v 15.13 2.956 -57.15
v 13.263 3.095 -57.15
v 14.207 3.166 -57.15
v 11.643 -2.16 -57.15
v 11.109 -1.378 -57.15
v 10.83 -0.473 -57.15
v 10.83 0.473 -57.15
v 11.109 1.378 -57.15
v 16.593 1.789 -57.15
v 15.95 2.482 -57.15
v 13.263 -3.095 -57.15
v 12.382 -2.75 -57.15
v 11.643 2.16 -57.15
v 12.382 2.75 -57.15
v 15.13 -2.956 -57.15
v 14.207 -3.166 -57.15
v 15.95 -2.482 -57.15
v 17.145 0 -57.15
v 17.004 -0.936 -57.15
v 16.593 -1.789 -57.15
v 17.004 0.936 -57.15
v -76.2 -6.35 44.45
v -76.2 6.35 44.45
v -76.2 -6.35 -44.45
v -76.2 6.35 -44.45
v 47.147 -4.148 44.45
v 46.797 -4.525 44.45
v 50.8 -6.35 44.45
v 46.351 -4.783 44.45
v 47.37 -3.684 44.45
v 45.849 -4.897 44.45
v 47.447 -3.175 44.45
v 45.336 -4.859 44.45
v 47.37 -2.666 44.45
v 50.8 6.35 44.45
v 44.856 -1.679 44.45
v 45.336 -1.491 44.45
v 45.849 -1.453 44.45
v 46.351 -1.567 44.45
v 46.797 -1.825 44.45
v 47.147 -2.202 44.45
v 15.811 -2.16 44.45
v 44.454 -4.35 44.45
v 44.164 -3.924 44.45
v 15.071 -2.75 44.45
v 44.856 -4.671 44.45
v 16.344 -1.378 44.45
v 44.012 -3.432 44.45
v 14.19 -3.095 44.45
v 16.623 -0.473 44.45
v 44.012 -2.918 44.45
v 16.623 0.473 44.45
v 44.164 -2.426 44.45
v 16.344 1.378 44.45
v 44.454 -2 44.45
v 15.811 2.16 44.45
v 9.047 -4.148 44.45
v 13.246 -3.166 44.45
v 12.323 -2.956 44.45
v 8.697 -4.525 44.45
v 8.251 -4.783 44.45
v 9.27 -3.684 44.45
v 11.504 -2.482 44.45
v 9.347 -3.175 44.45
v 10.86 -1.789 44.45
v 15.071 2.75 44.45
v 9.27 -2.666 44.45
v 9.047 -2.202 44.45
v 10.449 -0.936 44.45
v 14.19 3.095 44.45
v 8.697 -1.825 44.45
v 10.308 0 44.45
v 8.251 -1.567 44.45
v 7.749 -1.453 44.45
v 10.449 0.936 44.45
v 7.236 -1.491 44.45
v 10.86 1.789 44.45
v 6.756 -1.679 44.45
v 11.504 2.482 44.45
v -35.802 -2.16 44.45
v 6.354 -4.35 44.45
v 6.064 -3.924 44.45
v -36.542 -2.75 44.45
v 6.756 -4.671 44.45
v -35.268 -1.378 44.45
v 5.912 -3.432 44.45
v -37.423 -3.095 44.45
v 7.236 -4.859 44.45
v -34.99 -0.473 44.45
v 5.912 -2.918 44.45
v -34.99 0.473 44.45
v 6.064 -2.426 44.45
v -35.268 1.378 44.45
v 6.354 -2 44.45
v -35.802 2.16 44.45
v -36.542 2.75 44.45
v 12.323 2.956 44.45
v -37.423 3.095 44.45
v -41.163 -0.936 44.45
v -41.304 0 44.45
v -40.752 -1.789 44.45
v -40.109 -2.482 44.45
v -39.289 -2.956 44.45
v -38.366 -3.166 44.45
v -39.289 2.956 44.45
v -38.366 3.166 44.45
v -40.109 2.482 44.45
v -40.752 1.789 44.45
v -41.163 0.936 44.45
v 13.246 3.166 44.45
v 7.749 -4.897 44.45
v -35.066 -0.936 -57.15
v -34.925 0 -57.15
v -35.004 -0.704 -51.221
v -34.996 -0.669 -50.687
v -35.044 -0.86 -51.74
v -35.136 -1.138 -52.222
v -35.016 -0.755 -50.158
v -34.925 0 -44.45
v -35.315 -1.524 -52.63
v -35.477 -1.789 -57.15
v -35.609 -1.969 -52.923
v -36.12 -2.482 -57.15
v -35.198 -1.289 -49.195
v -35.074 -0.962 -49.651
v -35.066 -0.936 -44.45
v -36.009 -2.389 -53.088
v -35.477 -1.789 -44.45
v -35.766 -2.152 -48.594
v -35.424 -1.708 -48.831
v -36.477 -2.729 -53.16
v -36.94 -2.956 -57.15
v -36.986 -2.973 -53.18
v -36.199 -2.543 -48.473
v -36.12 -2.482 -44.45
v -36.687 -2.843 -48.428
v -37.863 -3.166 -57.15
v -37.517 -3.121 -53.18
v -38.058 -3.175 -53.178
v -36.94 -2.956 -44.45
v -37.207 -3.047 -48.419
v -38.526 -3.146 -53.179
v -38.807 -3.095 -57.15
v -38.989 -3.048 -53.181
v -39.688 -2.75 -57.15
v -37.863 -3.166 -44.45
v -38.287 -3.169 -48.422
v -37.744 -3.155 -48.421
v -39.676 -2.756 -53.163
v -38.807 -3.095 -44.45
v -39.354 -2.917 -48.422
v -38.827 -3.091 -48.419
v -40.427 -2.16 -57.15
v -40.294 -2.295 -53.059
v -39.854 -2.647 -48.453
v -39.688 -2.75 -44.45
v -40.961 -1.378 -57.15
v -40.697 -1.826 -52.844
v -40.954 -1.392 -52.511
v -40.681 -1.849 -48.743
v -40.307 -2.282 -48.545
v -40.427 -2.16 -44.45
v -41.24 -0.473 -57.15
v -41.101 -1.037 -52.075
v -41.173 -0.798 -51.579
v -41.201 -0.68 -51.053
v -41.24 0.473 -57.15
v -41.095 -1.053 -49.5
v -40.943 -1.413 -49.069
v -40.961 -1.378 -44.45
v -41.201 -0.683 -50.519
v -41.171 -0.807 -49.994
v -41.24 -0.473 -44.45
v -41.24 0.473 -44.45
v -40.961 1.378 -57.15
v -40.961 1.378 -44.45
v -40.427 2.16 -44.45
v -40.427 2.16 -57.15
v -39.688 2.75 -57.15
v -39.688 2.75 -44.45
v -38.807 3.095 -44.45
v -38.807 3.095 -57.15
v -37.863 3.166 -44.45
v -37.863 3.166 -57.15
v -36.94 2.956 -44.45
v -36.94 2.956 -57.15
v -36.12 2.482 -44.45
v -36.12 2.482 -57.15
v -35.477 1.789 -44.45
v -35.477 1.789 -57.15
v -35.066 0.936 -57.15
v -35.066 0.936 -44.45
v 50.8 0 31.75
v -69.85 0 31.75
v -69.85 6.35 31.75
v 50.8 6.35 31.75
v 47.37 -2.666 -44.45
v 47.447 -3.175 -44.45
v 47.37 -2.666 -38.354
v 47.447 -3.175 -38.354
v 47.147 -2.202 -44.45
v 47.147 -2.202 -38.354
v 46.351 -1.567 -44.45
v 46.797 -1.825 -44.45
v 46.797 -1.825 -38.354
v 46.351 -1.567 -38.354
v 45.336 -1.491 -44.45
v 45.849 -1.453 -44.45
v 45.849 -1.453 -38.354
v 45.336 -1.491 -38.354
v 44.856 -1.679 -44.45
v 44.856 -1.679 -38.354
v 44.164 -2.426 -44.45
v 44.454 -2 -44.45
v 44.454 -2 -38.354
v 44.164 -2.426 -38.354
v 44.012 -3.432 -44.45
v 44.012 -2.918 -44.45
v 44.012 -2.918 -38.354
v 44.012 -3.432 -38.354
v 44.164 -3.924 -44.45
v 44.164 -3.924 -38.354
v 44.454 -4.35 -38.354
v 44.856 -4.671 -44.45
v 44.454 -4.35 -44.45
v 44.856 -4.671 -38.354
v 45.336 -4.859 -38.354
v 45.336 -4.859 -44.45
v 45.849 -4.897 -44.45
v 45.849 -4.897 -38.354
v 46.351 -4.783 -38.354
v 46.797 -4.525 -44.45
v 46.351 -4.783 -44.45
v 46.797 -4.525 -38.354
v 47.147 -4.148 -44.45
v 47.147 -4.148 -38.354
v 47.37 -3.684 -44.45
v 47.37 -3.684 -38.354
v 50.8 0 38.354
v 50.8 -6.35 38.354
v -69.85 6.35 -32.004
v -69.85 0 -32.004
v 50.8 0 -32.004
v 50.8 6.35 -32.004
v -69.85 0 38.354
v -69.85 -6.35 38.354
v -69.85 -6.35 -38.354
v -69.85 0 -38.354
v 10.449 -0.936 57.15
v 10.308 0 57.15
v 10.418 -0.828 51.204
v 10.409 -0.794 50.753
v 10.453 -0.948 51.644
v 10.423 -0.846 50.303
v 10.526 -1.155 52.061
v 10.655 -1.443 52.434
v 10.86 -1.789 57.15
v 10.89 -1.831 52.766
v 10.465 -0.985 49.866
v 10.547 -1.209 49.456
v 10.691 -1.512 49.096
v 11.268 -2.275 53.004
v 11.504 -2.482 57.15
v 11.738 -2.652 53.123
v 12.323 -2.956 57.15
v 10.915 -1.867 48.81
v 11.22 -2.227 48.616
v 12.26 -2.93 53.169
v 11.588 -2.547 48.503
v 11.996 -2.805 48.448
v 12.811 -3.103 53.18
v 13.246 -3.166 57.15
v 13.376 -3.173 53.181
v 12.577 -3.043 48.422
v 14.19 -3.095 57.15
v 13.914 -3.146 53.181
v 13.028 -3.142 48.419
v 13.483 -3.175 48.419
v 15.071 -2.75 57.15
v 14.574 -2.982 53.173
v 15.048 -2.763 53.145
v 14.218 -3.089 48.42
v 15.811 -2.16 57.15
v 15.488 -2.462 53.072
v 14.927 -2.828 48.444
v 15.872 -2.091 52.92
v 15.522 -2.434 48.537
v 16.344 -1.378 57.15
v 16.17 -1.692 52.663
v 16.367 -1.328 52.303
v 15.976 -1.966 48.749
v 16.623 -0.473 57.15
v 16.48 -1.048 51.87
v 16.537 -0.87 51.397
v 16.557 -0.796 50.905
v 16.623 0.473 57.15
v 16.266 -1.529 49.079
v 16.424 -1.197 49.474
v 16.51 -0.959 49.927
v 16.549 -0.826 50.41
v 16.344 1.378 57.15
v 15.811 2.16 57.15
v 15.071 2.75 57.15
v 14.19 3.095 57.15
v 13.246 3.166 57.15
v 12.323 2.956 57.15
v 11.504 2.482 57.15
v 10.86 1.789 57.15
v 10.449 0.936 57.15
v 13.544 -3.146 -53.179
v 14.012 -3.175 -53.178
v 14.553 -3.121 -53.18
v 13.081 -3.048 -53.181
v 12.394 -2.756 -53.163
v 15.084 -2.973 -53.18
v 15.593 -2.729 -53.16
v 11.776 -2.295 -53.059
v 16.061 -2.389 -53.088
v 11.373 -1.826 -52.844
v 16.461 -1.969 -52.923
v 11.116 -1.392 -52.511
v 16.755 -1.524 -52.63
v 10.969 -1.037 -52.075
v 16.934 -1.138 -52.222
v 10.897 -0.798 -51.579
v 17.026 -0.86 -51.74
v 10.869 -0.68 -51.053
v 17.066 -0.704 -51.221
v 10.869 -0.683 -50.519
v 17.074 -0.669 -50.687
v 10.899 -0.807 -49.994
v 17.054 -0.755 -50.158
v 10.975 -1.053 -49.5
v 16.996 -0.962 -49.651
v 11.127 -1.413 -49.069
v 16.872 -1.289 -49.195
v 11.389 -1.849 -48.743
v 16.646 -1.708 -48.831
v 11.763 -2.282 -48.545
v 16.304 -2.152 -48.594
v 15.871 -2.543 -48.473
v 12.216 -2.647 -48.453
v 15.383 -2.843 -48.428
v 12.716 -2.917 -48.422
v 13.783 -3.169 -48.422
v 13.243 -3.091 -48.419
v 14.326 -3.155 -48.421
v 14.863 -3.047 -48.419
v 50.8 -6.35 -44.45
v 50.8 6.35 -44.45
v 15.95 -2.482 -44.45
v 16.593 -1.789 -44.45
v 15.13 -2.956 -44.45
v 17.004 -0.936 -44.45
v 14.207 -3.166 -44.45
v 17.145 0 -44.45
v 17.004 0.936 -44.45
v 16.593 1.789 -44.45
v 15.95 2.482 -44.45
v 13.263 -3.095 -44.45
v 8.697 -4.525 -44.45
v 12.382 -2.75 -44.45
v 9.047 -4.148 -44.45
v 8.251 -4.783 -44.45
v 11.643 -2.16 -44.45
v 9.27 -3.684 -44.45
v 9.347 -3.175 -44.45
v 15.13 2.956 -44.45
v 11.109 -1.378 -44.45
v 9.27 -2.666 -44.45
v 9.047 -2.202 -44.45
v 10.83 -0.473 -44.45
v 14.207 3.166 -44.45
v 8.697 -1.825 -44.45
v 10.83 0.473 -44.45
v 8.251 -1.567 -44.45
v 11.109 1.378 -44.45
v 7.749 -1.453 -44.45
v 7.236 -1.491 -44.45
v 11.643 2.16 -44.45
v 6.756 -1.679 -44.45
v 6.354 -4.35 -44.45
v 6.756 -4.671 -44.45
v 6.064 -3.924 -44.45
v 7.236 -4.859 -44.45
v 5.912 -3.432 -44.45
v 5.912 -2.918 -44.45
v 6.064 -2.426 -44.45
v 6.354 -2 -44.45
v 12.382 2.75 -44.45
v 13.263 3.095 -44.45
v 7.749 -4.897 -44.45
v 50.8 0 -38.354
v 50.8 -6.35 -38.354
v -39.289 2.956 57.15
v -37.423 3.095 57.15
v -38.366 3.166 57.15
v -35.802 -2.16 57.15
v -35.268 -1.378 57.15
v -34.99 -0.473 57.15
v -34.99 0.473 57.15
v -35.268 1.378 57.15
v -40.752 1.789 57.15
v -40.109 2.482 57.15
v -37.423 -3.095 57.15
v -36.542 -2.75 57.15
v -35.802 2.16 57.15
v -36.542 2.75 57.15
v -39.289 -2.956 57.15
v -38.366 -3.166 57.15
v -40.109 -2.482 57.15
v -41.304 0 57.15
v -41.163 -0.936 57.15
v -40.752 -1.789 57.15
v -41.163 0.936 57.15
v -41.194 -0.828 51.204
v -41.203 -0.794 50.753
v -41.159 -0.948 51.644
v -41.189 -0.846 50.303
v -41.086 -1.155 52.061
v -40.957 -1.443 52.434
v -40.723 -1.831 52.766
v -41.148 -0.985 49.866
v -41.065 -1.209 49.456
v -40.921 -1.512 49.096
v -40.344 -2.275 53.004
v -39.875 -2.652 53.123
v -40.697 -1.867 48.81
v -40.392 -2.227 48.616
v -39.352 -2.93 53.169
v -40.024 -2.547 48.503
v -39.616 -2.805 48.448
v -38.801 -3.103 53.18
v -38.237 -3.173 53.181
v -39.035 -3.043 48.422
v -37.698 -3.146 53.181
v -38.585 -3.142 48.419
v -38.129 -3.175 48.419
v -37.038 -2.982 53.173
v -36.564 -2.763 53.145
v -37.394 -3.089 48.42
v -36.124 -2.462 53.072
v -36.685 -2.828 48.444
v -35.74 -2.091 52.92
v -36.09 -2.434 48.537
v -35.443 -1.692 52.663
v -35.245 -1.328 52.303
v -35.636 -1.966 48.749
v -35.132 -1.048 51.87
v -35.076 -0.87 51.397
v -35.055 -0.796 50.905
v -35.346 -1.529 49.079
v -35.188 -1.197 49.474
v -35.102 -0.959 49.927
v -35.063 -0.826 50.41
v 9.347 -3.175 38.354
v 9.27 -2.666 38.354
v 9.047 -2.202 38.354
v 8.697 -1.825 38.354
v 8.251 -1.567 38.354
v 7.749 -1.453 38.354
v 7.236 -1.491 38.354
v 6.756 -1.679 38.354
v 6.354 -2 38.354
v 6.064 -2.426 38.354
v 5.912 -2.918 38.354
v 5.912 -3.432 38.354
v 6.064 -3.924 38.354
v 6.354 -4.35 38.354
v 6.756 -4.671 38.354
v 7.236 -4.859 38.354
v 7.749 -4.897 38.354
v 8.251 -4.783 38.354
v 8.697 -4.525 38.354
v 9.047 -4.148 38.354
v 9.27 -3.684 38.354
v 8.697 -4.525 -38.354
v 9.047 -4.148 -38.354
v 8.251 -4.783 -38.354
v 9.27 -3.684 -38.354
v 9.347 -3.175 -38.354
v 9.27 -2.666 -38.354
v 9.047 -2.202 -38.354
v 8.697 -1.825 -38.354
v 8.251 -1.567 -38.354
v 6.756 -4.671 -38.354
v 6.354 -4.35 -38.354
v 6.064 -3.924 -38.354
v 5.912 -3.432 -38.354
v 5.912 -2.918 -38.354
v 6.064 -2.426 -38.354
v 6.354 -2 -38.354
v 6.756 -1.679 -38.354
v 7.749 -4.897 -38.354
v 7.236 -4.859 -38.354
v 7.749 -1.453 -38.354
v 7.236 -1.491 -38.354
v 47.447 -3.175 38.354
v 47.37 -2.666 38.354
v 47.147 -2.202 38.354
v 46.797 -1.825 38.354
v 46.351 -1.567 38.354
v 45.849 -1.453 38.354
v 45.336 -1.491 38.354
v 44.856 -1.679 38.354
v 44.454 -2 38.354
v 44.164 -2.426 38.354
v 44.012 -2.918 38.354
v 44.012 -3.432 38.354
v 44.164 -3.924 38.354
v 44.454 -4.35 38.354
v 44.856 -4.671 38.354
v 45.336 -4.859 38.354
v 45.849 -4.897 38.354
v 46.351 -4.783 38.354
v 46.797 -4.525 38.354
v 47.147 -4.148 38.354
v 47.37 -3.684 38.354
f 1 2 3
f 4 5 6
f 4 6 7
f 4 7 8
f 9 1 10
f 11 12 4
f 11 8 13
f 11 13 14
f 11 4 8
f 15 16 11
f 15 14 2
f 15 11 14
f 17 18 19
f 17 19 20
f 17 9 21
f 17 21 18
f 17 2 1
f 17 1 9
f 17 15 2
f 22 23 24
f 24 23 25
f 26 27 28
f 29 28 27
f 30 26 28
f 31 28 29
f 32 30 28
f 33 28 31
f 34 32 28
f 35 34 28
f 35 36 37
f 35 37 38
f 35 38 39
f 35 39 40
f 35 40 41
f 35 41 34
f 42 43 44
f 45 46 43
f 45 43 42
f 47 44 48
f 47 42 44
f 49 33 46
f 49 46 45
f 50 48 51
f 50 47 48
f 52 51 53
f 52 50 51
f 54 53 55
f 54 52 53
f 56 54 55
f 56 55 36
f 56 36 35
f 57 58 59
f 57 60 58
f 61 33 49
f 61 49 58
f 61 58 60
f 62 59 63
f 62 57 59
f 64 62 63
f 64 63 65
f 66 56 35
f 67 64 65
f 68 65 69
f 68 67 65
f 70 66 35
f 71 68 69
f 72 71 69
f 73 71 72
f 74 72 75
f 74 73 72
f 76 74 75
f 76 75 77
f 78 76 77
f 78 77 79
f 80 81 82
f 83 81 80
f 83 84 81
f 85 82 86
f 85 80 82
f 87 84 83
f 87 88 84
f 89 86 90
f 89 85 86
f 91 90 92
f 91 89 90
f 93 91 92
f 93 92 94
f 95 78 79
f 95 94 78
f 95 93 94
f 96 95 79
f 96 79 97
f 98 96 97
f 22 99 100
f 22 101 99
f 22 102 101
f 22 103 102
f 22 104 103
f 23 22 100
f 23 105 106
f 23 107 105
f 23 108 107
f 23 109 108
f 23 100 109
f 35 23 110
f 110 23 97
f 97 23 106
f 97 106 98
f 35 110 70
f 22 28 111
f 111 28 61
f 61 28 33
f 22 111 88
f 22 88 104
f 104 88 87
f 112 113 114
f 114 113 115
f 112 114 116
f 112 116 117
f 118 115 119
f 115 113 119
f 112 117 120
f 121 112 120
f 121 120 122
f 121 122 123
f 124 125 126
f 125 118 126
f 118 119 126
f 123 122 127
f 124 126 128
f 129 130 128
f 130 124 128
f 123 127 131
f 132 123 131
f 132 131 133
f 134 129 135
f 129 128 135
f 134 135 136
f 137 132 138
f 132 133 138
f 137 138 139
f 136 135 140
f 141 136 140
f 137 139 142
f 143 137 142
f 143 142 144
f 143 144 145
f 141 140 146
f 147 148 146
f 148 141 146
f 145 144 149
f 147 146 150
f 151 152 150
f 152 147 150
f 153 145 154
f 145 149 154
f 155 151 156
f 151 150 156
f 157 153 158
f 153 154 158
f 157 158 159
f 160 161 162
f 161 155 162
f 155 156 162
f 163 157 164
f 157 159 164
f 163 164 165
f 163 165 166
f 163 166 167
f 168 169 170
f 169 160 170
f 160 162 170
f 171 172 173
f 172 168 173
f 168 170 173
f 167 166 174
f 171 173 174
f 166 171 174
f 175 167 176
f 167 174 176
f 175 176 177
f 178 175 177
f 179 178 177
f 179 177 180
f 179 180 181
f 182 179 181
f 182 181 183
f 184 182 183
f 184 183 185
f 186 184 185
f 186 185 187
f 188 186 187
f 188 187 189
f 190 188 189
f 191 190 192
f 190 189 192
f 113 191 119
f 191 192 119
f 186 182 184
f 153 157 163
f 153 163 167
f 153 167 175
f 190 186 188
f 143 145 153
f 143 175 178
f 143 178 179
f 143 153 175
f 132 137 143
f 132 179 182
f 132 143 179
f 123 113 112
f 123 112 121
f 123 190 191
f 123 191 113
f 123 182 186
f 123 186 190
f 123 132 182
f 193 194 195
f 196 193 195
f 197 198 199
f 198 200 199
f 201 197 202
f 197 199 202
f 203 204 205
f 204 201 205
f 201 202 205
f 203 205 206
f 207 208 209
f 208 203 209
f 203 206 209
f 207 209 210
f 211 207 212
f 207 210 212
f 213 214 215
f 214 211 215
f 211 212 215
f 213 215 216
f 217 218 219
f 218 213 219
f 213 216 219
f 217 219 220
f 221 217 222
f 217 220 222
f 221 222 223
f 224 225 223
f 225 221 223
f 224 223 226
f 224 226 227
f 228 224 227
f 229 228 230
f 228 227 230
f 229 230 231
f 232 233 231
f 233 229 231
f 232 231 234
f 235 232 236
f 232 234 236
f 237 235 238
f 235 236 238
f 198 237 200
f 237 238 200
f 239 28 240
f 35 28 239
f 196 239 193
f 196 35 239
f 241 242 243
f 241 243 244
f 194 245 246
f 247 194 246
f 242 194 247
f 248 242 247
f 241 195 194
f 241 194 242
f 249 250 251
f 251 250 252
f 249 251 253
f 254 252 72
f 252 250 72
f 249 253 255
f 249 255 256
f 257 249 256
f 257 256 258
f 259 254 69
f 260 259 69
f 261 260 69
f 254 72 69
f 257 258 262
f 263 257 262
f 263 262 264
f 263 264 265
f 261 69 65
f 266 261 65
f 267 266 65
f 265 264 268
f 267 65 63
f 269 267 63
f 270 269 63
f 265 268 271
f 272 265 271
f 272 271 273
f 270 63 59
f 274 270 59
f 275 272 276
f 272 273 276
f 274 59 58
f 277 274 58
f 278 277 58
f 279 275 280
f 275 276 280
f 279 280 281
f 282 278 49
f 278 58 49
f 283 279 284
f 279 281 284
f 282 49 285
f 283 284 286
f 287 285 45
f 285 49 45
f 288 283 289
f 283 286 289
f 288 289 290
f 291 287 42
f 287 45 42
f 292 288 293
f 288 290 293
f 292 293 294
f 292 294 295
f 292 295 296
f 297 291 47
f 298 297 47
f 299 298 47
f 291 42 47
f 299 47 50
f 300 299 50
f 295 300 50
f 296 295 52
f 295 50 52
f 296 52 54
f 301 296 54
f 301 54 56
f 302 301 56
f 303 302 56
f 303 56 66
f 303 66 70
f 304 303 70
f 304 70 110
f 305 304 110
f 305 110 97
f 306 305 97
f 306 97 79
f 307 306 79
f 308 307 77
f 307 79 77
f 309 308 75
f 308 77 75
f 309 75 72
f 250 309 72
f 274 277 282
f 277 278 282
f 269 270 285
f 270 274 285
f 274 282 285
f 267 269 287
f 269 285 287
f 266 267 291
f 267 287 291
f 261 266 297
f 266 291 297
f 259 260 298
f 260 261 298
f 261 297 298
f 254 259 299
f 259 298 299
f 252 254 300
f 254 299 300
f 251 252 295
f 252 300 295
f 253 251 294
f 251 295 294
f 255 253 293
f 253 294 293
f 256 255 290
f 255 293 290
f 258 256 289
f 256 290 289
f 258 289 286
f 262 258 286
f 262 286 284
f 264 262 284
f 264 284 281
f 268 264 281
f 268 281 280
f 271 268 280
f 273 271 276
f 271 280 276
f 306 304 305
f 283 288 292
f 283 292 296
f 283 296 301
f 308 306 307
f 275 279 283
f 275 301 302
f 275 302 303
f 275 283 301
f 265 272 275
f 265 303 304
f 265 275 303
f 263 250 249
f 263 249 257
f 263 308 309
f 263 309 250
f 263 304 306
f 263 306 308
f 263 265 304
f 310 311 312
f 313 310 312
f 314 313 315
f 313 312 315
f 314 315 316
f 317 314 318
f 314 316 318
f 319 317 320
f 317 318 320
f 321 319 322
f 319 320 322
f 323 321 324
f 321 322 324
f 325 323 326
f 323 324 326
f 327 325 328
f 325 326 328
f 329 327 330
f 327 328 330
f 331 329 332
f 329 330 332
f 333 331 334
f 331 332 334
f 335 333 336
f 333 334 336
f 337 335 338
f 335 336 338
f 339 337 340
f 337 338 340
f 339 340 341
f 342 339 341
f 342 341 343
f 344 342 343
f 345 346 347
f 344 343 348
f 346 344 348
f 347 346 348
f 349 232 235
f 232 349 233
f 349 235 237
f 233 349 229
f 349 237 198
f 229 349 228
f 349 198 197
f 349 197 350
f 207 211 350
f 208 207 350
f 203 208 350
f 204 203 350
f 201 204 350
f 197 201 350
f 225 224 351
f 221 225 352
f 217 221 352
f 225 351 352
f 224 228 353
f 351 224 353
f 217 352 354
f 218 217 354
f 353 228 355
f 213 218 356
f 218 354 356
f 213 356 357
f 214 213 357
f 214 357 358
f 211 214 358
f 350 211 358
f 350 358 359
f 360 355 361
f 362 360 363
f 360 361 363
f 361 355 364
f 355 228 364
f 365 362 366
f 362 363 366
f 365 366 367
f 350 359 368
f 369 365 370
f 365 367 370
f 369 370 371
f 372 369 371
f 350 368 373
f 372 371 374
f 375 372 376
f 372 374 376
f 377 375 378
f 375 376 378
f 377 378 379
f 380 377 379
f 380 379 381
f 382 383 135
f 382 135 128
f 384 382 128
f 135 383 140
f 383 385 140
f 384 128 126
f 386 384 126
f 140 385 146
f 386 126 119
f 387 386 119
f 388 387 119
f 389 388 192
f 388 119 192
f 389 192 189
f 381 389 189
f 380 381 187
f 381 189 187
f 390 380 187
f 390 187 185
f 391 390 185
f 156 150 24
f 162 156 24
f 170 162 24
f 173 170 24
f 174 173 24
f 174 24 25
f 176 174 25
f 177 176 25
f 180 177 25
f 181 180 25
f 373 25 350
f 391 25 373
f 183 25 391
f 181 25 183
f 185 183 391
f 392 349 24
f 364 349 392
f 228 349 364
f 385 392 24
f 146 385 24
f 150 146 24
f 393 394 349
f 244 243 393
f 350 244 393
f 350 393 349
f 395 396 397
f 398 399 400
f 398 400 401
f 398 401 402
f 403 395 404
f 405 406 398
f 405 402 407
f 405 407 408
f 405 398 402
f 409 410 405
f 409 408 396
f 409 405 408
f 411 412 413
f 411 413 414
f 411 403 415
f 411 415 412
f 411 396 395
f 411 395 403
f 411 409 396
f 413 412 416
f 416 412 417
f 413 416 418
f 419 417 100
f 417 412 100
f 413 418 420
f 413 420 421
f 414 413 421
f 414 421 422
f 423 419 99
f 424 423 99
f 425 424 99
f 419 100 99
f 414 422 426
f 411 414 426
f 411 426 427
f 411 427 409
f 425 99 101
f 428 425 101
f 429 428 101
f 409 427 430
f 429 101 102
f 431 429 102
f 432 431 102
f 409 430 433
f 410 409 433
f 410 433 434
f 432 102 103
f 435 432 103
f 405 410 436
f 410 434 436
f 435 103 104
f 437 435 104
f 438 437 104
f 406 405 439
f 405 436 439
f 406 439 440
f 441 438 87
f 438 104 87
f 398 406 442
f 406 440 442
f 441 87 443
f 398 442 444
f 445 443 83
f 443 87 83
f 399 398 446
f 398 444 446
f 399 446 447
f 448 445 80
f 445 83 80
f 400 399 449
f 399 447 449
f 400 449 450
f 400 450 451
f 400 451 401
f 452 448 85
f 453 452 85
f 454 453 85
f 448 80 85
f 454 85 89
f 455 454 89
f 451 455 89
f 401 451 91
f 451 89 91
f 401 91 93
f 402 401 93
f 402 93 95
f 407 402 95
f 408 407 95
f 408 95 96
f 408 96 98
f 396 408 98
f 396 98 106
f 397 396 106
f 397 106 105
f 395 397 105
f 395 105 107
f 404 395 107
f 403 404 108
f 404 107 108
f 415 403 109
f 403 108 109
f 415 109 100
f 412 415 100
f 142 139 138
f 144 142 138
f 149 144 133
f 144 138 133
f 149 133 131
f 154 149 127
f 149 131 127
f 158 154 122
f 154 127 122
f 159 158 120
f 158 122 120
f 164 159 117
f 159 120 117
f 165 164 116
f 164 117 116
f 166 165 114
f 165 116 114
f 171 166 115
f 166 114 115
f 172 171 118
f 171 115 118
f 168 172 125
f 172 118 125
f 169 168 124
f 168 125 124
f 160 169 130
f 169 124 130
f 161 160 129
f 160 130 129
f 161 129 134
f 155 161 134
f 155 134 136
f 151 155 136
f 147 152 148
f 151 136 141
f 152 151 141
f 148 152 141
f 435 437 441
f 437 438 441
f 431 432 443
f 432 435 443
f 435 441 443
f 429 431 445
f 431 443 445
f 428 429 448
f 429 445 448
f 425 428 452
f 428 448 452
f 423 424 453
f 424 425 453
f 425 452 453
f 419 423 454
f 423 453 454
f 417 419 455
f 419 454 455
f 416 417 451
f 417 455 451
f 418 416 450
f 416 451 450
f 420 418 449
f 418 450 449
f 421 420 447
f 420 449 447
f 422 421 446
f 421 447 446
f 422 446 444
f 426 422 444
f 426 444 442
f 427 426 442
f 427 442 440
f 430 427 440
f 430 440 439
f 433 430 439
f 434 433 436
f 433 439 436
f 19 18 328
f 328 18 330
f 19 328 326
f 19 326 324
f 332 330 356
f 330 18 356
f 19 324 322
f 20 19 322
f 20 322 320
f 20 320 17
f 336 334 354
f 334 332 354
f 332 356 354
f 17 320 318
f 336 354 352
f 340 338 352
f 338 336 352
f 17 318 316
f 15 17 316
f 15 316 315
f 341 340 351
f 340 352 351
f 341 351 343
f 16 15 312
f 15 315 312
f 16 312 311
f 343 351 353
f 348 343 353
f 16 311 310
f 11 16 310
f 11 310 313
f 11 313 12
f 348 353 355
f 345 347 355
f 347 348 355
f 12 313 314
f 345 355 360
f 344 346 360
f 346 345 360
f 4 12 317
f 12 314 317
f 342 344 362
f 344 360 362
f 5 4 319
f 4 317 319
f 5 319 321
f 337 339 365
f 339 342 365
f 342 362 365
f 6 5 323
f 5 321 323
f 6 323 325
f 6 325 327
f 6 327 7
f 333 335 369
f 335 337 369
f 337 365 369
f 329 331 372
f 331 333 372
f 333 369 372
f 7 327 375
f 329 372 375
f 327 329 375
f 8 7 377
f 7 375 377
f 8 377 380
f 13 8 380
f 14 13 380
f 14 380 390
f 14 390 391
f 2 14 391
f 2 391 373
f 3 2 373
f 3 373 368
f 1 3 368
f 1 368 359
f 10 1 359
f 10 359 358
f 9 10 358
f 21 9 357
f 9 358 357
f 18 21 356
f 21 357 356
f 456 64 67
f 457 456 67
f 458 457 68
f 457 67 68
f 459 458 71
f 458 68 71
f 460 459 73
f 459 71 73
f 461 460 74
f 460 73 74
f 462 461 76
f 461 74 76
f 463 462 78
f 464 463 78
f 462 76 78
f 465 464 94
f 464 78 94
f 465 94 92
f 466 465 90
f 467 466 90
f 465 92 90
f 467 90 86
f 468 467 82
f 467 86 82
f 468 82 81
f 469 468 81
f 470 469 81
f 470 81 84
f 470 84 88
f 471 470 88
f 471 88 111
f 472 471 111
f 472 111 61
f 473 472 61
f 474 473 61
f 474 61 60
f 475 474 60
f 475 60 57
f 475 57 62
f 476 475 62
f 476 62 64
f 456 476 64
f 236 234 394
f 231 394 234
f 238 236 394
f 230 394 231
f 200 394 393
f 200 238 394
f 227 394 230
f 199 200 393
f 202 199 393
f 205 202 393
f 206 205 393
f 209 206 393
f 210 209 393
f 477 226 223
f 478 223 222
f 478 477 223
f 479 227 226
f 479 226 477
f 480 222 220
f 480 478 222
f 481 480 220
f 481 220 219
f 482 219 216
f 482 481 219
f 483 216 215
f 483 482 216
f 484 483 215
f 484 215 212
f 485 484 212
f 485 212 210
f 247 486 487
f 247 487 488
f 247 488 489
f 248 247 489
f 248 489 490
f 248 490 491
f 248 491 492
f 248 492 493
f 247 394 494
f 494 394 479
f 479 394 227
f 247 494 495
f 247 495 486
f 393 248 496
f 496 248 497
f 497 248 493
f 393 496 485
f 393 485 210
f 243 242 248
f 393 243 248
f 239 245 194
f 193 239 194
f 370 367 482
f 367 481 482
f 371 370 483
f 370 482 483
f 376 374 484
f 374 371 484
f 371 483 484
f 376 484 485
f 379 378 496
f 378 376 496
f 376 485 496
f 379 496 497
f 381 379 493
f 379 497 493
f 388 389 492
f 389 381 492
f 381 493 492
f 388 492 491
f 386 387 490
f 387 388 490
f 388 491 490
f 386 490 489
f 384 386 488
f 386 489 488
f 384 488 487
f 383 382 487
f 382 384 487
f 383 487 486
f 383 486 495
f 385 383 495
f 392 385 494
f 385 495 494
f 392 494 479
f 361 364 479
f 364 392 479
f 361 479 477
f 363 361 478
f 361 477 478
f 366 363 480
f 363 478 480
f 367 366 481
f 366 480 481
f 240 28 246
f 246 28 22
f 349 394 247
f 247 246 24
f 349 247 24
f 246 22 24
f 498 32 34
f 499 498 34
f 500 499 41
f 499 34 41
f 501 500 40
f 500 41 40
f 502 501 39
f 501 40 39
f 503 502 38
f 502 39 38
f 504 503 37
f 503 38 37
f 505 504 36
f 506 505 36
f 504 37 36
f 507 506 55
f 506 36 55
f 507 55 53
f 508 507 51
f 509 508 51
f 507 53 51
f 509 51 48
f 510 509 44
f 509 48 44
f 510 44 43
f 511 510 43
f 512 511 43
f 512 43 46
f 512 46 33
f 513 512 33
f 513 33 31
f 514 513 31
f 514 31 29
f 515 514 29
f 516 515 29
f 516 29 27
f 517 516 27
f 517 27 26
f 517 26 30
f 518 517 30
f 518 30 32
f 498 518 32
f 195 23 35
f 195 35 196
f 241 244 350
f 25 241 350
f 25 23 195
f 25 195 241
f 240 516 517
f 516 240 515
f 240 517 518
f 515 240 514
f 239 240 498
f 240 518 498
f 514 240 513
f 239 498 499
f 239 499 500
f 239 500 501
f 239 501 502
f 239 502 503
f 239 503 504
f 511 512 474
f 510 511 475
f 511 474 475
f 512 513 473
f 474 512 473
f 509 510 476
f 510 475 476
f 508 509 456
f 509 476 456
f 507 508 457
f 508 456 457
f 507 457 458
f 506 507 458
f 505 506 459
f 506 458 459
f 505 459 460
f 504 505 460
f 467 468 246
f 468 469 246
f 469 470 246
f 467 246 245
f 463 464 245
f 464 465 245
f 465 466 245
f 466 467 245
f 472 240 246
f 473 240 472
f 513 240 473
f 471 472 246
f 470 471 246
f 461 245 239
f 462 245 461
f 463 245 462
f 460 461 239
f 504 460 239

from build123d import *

# Parameters (mm, degrees)
SKETCH1_W                       = 6.35
SKETCH1_H                       = 88.9
BOSS_EXTRUDE1_DEPTH             = 6.35
SKETCH2_W                       = 12.7
SKETCH2_H                       = 6.35
BOSS_EXTRUDE2_DEPTH             = 120.65
SKETCH3_W                       = 12.446
SKETCH3_H                       = 6.35
BOSS_EXTRUDE3_DEPTH             = 120.65
SKETCH1_2_W                     = 6.35
SKETCH1_2_H                     = 88.9
BOSS_EXTRUDE4_DEPTH             = 6.35
SKETCH4_W                       = 6.096
SKETCH4_H                       = 6.35
BOSS_EXTRUDE5_DEPTH             = 120.65
SKETCH5_W                       = 6.096
SKETCH5_H                       = 6.35
BOSS_EXTRUDE6_DEPTH             = 120.65
F_8_32_TAPPED_HOLE1_D           = 3.4544
F_8_32_TAPPED_HOLE1_ON_FACE_2_D = 3.4544
SKETCH7_R                       = 3.175
BOSS_EXTRUDE7_DEPTH             = 12.7
SKETCH8_R                       = 3.175
BOSS_EXTRUDE8_DEPTH             = 12.7
SKETCH9_R                       = 3.175
BOSS_EXTRUDE10_DEPTH            = 12.7
SKETCH10_R                      = 3.175
BOSS_EXTRUDE11_DEPTH            = 12.7
SKETCH12_R                      = 2.38125
CUT_EXTRUDE2_DEPTH              = 127
SKETCH13_R                      = 2.38125
CUT_EXTRUDE3_DEPTH              = 127


with BuildPart() as part:
    # Sketch1 → Boss-Extrude1 (new body)
    with BuildSketch(Plane(origin=(0, 0, 0), x_dir=(1, 0, 0), z_dir=(0, 1, 0))):
        with Locations((-73.025, 0)):
            Rectangle(SKETCH1_W, SKETCH1_H)
    extrude(amount=BOSS_EXTRUDE1_DEPTH)

    # Sketch2 → Boss-Extrude2 (add)
    with BuildSketch(Plane(origin=(-69.85, 0, 0), x_dir=(0, 0, -1), z_dir=(1, 0, 0))):
        with Locations((-38.1, 3.175)):
            Rectangle(SKETCH2_W, SKETCH2_H)
    extrude(amount=BOSS_EXTRUDE2_DEPTH)

    # Sketch3 → Boss-Extrude3 (add)
    with BuildSketch(Plane(origin=(-69.85, 0, 0), x_dir=(0, 0, -1), z_dir=(1, 0, 0))):
        with Locations((38.227, 3.175)):
            Rectangle(SKETCH3_W, SKETCH3_H)
    extrude(amount=BOSS_EXTRUDE3_DEPTH)

    # Sketch1<2> → Boss-Extrude4 (add)
    with BuildSketch(Plane(origin=(0, 0, 0), x_dir=(1, 0, 0), z_dir=(0, 1, 0))):
        with Locations((-73.025, 0)):
            Rectangle(SKETCH1_2_W, SKETCH1_2_H)
    extrude(amount=-BOSS_EXTRUDE4_DEPTH)

    # Sketch4 → Boss-Extrude5 (add)
    with BuildSketch(Plane(origin=(-69.85, 0, 0), x_dir=(0, 0, -1), z_dir=(1, 0, 0))):
        with Locations((-41.402, -3.175)):
            Rectangle(SKETCH4_W, SKETCH4_H)
    extrude(amount=BOSS_EXTRUDE5_DEPTH)

    # Sketch5 → Boss-Extrude6 (add)
    with BuildSketch(Plane(origin=(-69.85, 0, 0), x_dir=(0, 0, -1), z_dir=(1, 0, 0))):
        with Locations((41.402, -3.175)):
            Rectangle(SKETCH5_W, SKETCH5_H)
    extrude(amount=BOSS_EXTRUDE6_DEPTH)

    # #8-32 Tapped Hole1 (through all)
    with Locations(Plane(origin=(45.72, -3.175, -44.45), x_dir=(-1, 0, 0), z_dir=(0, 0, -1))):
        with Locations((0, 0), (38.1, 0)):
            Hole(F_8_32_TAPPED_HOLE1_D / 2)

    # #8-32 Tapped Hole1 on face 2 (through all)
    with Locations(Plane(origin=(45.72, -3.175, 44.45), x_dir=(1, 0, 0), z_dir=(0, 0, 1))):
        with Locations((0, 0), (-38.1, 0)):
            Hole(F_8_32_TAPPED_HOLE1_ON_FACE_2_D / 2)

    # Sketch7 → Boss-Extrude7 (add)
    with BuildSketch(Plane(origin=(-14.456865446, 0, 44.45), x_dir=(1, 0, 0), z_dir=(0, 0, 1))):
        with Locations(Location((27.94, 0, 0), (0, 0, 180))):
            Circle(SKETCH7_R)
    extrude(amount=BOSS_EXTRUDE7_DEPTH)

    # Sketch8 → Boss-Extrude8 (add)
    with BuildSketch(Plane.XY.offset(44.45)):
        with Locations(Location((-38.12905493, 0, 0), (0, 0, 180))):
            Circle(SKETCH8_R)
    extrude(amount=BOSS_EXTRUDE8_DEPTH)

    # Sketch9 → Boss-Extrude10 (add)
    with BuildSketch(Plane(origin=(0, 0, -44.45), x_dir=(-1, 0, 0), z_dir=(0, 0, -1))):
        with Locations(Location((38.1, 0, 0), (0, 0, 180))):
            Circle(SKETCH9_R)
    extrude(amount=BOSS_EXTRUDE10_DEPTH)

    # Sketch10 → Boss-Extrude11 (add)
    with BuildSketch(Plane(origin=(0, 0, -44.45), x_dir=(-1, 0, 0), z_dir=(0, 0, -1))):
        with Locations(Location((-13.97, 0, 0), (0, 0, 180))):
            Circle(SKETCH10_R)
    extrude(amount=BOSS_EXTRUDE11_DEPTH)

    # Sketch12 → Cut-Extrude2 (cut)
    with BuildSketch(Plane(origin=(17.145, 0, 0), x_dir=(0, 0, -1), z_dir=(1, 0, 0))):
        with Locations((50.8, -3.048)):
            Circle(SKETCH12_R)
    extrude(amount=-CUT_EXTRUDE2_DEPTH, mode=Mode.SUBTRACT)

    # Sketch13 → Cut-Extrude3 (cut)
    with BuildSketch(Plane(origin=(17.145, 0, 0), x_dir=(0, 0, -1), z_dir=(1, 0, 0))):
        with Locations((-50.8, -3.175)):
            Circle(SKETCH13_R)
    extrude(amount=-CUT_EXTRUDE3_DEPTH, mode=Mode.SUBTRACT)


solid = part.part
